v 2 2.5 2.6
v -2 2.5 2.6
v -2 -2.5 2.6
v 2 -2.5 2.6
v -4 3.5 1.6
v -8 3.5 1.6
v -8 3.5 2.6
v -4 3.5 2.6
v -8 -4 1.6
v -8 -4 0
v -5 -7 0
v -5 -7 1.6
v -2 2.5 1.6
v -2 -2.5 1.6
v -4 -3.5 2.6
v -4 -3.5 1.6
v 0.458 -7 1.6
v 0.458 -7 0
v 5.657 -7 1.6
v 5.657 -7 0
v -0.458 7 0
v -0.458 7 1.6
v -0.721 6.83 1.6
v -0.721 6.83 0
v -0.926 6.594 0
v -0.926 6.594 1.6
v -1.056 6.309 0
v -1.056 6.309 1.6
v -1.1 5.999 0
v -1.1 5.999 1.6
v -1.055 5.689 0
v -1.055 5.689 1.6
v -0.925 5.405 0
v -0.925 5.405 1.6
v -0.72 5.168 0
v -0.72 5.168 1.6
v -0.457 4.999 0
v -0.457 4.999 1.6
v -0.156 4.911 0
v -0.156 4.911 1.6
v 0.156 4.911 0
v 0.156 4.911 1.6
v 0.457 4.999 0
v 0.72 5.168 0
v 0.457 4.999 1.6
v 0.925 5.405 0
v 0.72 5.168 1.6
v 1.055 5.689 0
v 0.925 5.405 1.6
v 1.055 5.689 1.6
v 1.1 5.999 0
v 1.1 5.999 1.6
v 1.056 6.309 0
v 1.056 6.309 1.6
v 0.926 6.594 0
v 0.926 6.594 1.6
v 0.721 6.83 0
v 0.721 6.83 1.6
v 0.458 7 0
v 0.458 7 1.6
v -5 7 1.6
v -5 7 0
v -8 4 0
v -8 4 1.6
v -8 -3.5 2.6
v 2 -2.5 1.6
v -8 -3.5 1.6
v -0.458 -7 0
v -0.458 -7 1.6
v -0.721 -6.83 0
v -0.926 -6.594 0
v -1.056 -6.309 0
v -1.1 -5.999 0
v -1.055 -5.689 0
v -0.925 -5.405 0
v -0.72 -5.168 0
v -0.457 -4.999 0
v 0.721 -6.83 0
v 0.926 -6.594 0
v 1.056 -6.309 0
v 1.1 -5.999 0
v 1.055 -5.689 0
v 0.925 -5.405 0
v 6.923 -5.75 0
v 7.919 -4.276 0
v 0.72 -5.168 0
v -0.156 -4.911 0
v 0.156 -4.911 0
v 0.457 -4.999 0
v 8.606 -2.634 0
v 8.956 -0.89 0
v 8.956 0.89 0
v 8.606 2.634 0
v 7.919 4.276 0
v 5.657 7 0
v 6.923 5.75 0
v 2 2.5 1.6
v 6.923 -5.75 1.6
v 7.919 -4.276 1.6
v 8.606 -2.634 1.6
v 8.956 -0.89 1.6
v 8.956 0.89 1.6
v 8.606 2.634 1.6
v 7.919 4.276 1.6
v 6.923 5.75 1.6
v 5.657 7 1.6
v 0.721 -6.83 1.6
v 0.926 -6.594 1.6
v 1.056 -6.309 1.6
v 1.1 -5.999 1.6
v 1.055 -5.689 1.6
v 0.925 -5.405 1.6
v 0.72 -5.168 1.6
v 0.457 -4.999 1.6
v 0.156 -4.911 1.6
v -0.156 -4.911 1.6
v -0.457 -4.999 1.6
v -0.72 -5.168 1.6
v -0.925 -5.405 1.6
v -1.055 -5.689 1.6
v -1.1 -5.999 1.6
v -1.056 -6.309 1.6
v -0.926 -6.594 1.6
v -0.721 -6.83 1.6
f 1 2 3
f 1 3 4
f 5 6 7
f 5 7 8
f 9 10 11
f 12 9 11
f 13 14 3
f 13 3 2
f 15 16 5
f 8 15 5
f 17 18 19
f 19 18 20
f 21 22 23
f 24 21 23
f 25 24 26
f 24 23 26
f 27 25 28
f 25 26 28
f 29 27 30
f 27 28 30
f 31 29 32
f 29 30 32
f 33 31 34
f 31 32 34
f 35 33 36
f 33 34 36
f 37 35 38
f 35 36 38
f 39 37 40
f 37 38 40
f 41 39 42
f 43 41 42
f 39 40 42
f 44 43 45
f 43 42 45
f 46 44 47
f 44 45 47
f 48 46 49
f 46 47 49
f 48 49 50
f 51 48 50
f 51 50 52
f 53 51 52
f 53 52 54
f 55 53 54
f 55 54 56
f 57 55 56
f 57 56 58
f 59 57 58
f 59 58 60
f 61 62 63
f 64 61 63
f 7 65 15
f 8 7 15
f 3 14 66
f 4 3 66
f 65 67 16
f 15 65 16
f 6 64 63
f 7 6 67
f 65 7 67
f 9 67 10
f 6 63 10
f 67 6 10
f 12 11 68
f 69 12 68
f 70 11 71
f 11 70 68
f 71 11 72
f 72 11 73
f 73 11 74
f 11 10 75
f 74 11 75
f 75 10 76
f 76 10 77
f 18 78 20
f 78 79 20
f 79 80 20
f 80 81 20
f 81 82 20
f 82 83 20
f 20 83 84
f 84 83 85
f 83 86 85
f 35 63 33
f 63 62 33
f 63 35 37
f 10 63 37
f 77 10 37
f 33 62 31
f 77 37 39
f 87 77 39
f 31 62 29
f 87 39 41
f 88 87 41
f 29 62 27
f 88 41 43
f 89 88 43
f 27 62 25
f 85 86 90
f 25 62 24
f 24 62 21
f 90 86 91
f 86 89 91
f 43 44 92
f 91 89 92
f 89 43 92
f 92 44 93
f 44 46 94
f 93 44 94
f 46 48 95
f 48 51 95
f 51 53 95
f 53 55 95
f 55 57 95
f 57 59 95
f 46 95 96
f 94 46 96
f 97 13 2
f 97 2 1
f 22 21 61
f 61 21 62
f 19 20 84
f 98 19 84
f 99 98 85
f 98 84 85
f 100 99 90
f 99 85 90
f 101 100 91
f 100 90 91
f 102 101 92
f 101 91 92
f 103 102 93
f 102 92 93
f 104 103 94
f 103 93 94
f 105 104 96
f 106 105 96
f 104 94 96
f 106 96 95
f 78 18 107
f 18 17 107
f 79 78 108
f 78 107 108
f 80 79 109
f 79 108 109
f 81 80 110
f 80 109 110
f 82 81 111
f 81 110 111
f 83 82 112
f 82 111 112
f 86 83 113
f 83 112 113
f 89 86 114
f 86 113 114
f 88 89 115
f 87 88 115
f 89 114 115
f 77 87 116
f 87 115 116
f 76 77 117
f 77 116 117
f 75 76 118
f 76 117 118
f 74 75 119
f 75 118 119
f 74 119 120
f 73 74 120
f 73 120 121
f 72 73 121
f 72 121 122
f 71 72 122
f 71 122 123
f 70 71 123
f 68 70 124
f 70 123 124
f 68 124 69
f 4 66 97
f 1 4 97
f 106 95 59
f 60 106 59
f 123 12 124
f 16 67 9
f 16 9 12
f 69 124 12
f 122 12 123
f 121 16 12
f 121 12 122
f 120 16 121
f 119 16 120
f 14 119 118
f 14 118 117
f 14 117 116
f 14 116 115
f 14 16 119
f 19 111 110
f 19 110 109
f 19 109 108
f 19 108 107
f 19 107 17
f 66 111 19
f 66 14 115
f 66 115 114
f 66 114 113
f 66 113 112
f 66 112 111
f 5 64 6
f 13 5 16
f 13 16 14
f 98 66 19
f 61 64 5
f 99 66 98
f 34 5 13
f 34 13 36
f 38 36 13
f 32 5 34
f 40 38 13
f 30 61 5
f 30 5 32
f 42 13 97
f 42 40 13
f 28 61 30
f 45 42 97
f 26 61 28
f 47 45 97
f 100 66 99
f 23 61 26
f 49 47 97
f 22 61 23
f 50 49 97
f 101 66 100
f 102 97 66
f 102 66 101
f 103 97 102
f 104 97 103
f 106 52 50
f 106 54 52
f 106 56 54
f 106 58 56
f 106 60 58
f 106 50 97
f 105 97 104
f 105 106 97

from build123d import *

# Parameters (mm, degrees)
SALIENTE_EXTRUIR1_DEPTH = 1.6
CROQUIS2_R              = 1.1
CORTAR_EXTRUIR2_DEPTH   = 12.513470372
CROQUIS3_W              = 4
CROQUIS3_H              = 5
CROQUIS3_H_2            = 7
SALIENTE_EXTRUIR2_DEPTH = 1


with BuildPart() as part:
    # Croquis1 → Saliente-Extruir1 (new body)
    with BuildSketch(Plane.XY):
        with BuildLine():
            Line((5.656854249, 7), (-5, 7))
            Line((-5, 7), (-8, 4))
            Line((-8, 4), (-8, -4))
            Line((-8, -4), (-5, -7))
            Line((-5, -7), (5.656854249, -7))
            ThreePointArc((5.656854249, -7), (9, 0), (5.656854249, 7))
        make_face()
    extrude(amount=SALIENTE_EXTRUIR1_DEPTH)

    # Croquis2 → Cortar-Extruir2 (cut, through all)
    with BuildSketch(Plane.XY.offset(1.6)):
        with Locations((0, 6)):
            Circle(CROQUIS2_R)
        with Locations((0, -6)):
            Circle(CROQUIS2_R)
    extrude(amount=-CORTAR_EXTRUIR2_DEPTH, mode=Mode.SUBTRACT)

    # Croquis3 → Saliente-Extruir2 (add)
    with BuildSketch(Plane.XY.offset(1.6)):
        Rectangle(CROQUIS3_W, CROQUIS3_H)
        with Locations((-6, 0)):
            Rectangle(CROQUIS3_W, CROQUIS3_H_2)
    extrude(amount=SALIENTE_EXTRUIR2_DEPTH)


solid = part.part
